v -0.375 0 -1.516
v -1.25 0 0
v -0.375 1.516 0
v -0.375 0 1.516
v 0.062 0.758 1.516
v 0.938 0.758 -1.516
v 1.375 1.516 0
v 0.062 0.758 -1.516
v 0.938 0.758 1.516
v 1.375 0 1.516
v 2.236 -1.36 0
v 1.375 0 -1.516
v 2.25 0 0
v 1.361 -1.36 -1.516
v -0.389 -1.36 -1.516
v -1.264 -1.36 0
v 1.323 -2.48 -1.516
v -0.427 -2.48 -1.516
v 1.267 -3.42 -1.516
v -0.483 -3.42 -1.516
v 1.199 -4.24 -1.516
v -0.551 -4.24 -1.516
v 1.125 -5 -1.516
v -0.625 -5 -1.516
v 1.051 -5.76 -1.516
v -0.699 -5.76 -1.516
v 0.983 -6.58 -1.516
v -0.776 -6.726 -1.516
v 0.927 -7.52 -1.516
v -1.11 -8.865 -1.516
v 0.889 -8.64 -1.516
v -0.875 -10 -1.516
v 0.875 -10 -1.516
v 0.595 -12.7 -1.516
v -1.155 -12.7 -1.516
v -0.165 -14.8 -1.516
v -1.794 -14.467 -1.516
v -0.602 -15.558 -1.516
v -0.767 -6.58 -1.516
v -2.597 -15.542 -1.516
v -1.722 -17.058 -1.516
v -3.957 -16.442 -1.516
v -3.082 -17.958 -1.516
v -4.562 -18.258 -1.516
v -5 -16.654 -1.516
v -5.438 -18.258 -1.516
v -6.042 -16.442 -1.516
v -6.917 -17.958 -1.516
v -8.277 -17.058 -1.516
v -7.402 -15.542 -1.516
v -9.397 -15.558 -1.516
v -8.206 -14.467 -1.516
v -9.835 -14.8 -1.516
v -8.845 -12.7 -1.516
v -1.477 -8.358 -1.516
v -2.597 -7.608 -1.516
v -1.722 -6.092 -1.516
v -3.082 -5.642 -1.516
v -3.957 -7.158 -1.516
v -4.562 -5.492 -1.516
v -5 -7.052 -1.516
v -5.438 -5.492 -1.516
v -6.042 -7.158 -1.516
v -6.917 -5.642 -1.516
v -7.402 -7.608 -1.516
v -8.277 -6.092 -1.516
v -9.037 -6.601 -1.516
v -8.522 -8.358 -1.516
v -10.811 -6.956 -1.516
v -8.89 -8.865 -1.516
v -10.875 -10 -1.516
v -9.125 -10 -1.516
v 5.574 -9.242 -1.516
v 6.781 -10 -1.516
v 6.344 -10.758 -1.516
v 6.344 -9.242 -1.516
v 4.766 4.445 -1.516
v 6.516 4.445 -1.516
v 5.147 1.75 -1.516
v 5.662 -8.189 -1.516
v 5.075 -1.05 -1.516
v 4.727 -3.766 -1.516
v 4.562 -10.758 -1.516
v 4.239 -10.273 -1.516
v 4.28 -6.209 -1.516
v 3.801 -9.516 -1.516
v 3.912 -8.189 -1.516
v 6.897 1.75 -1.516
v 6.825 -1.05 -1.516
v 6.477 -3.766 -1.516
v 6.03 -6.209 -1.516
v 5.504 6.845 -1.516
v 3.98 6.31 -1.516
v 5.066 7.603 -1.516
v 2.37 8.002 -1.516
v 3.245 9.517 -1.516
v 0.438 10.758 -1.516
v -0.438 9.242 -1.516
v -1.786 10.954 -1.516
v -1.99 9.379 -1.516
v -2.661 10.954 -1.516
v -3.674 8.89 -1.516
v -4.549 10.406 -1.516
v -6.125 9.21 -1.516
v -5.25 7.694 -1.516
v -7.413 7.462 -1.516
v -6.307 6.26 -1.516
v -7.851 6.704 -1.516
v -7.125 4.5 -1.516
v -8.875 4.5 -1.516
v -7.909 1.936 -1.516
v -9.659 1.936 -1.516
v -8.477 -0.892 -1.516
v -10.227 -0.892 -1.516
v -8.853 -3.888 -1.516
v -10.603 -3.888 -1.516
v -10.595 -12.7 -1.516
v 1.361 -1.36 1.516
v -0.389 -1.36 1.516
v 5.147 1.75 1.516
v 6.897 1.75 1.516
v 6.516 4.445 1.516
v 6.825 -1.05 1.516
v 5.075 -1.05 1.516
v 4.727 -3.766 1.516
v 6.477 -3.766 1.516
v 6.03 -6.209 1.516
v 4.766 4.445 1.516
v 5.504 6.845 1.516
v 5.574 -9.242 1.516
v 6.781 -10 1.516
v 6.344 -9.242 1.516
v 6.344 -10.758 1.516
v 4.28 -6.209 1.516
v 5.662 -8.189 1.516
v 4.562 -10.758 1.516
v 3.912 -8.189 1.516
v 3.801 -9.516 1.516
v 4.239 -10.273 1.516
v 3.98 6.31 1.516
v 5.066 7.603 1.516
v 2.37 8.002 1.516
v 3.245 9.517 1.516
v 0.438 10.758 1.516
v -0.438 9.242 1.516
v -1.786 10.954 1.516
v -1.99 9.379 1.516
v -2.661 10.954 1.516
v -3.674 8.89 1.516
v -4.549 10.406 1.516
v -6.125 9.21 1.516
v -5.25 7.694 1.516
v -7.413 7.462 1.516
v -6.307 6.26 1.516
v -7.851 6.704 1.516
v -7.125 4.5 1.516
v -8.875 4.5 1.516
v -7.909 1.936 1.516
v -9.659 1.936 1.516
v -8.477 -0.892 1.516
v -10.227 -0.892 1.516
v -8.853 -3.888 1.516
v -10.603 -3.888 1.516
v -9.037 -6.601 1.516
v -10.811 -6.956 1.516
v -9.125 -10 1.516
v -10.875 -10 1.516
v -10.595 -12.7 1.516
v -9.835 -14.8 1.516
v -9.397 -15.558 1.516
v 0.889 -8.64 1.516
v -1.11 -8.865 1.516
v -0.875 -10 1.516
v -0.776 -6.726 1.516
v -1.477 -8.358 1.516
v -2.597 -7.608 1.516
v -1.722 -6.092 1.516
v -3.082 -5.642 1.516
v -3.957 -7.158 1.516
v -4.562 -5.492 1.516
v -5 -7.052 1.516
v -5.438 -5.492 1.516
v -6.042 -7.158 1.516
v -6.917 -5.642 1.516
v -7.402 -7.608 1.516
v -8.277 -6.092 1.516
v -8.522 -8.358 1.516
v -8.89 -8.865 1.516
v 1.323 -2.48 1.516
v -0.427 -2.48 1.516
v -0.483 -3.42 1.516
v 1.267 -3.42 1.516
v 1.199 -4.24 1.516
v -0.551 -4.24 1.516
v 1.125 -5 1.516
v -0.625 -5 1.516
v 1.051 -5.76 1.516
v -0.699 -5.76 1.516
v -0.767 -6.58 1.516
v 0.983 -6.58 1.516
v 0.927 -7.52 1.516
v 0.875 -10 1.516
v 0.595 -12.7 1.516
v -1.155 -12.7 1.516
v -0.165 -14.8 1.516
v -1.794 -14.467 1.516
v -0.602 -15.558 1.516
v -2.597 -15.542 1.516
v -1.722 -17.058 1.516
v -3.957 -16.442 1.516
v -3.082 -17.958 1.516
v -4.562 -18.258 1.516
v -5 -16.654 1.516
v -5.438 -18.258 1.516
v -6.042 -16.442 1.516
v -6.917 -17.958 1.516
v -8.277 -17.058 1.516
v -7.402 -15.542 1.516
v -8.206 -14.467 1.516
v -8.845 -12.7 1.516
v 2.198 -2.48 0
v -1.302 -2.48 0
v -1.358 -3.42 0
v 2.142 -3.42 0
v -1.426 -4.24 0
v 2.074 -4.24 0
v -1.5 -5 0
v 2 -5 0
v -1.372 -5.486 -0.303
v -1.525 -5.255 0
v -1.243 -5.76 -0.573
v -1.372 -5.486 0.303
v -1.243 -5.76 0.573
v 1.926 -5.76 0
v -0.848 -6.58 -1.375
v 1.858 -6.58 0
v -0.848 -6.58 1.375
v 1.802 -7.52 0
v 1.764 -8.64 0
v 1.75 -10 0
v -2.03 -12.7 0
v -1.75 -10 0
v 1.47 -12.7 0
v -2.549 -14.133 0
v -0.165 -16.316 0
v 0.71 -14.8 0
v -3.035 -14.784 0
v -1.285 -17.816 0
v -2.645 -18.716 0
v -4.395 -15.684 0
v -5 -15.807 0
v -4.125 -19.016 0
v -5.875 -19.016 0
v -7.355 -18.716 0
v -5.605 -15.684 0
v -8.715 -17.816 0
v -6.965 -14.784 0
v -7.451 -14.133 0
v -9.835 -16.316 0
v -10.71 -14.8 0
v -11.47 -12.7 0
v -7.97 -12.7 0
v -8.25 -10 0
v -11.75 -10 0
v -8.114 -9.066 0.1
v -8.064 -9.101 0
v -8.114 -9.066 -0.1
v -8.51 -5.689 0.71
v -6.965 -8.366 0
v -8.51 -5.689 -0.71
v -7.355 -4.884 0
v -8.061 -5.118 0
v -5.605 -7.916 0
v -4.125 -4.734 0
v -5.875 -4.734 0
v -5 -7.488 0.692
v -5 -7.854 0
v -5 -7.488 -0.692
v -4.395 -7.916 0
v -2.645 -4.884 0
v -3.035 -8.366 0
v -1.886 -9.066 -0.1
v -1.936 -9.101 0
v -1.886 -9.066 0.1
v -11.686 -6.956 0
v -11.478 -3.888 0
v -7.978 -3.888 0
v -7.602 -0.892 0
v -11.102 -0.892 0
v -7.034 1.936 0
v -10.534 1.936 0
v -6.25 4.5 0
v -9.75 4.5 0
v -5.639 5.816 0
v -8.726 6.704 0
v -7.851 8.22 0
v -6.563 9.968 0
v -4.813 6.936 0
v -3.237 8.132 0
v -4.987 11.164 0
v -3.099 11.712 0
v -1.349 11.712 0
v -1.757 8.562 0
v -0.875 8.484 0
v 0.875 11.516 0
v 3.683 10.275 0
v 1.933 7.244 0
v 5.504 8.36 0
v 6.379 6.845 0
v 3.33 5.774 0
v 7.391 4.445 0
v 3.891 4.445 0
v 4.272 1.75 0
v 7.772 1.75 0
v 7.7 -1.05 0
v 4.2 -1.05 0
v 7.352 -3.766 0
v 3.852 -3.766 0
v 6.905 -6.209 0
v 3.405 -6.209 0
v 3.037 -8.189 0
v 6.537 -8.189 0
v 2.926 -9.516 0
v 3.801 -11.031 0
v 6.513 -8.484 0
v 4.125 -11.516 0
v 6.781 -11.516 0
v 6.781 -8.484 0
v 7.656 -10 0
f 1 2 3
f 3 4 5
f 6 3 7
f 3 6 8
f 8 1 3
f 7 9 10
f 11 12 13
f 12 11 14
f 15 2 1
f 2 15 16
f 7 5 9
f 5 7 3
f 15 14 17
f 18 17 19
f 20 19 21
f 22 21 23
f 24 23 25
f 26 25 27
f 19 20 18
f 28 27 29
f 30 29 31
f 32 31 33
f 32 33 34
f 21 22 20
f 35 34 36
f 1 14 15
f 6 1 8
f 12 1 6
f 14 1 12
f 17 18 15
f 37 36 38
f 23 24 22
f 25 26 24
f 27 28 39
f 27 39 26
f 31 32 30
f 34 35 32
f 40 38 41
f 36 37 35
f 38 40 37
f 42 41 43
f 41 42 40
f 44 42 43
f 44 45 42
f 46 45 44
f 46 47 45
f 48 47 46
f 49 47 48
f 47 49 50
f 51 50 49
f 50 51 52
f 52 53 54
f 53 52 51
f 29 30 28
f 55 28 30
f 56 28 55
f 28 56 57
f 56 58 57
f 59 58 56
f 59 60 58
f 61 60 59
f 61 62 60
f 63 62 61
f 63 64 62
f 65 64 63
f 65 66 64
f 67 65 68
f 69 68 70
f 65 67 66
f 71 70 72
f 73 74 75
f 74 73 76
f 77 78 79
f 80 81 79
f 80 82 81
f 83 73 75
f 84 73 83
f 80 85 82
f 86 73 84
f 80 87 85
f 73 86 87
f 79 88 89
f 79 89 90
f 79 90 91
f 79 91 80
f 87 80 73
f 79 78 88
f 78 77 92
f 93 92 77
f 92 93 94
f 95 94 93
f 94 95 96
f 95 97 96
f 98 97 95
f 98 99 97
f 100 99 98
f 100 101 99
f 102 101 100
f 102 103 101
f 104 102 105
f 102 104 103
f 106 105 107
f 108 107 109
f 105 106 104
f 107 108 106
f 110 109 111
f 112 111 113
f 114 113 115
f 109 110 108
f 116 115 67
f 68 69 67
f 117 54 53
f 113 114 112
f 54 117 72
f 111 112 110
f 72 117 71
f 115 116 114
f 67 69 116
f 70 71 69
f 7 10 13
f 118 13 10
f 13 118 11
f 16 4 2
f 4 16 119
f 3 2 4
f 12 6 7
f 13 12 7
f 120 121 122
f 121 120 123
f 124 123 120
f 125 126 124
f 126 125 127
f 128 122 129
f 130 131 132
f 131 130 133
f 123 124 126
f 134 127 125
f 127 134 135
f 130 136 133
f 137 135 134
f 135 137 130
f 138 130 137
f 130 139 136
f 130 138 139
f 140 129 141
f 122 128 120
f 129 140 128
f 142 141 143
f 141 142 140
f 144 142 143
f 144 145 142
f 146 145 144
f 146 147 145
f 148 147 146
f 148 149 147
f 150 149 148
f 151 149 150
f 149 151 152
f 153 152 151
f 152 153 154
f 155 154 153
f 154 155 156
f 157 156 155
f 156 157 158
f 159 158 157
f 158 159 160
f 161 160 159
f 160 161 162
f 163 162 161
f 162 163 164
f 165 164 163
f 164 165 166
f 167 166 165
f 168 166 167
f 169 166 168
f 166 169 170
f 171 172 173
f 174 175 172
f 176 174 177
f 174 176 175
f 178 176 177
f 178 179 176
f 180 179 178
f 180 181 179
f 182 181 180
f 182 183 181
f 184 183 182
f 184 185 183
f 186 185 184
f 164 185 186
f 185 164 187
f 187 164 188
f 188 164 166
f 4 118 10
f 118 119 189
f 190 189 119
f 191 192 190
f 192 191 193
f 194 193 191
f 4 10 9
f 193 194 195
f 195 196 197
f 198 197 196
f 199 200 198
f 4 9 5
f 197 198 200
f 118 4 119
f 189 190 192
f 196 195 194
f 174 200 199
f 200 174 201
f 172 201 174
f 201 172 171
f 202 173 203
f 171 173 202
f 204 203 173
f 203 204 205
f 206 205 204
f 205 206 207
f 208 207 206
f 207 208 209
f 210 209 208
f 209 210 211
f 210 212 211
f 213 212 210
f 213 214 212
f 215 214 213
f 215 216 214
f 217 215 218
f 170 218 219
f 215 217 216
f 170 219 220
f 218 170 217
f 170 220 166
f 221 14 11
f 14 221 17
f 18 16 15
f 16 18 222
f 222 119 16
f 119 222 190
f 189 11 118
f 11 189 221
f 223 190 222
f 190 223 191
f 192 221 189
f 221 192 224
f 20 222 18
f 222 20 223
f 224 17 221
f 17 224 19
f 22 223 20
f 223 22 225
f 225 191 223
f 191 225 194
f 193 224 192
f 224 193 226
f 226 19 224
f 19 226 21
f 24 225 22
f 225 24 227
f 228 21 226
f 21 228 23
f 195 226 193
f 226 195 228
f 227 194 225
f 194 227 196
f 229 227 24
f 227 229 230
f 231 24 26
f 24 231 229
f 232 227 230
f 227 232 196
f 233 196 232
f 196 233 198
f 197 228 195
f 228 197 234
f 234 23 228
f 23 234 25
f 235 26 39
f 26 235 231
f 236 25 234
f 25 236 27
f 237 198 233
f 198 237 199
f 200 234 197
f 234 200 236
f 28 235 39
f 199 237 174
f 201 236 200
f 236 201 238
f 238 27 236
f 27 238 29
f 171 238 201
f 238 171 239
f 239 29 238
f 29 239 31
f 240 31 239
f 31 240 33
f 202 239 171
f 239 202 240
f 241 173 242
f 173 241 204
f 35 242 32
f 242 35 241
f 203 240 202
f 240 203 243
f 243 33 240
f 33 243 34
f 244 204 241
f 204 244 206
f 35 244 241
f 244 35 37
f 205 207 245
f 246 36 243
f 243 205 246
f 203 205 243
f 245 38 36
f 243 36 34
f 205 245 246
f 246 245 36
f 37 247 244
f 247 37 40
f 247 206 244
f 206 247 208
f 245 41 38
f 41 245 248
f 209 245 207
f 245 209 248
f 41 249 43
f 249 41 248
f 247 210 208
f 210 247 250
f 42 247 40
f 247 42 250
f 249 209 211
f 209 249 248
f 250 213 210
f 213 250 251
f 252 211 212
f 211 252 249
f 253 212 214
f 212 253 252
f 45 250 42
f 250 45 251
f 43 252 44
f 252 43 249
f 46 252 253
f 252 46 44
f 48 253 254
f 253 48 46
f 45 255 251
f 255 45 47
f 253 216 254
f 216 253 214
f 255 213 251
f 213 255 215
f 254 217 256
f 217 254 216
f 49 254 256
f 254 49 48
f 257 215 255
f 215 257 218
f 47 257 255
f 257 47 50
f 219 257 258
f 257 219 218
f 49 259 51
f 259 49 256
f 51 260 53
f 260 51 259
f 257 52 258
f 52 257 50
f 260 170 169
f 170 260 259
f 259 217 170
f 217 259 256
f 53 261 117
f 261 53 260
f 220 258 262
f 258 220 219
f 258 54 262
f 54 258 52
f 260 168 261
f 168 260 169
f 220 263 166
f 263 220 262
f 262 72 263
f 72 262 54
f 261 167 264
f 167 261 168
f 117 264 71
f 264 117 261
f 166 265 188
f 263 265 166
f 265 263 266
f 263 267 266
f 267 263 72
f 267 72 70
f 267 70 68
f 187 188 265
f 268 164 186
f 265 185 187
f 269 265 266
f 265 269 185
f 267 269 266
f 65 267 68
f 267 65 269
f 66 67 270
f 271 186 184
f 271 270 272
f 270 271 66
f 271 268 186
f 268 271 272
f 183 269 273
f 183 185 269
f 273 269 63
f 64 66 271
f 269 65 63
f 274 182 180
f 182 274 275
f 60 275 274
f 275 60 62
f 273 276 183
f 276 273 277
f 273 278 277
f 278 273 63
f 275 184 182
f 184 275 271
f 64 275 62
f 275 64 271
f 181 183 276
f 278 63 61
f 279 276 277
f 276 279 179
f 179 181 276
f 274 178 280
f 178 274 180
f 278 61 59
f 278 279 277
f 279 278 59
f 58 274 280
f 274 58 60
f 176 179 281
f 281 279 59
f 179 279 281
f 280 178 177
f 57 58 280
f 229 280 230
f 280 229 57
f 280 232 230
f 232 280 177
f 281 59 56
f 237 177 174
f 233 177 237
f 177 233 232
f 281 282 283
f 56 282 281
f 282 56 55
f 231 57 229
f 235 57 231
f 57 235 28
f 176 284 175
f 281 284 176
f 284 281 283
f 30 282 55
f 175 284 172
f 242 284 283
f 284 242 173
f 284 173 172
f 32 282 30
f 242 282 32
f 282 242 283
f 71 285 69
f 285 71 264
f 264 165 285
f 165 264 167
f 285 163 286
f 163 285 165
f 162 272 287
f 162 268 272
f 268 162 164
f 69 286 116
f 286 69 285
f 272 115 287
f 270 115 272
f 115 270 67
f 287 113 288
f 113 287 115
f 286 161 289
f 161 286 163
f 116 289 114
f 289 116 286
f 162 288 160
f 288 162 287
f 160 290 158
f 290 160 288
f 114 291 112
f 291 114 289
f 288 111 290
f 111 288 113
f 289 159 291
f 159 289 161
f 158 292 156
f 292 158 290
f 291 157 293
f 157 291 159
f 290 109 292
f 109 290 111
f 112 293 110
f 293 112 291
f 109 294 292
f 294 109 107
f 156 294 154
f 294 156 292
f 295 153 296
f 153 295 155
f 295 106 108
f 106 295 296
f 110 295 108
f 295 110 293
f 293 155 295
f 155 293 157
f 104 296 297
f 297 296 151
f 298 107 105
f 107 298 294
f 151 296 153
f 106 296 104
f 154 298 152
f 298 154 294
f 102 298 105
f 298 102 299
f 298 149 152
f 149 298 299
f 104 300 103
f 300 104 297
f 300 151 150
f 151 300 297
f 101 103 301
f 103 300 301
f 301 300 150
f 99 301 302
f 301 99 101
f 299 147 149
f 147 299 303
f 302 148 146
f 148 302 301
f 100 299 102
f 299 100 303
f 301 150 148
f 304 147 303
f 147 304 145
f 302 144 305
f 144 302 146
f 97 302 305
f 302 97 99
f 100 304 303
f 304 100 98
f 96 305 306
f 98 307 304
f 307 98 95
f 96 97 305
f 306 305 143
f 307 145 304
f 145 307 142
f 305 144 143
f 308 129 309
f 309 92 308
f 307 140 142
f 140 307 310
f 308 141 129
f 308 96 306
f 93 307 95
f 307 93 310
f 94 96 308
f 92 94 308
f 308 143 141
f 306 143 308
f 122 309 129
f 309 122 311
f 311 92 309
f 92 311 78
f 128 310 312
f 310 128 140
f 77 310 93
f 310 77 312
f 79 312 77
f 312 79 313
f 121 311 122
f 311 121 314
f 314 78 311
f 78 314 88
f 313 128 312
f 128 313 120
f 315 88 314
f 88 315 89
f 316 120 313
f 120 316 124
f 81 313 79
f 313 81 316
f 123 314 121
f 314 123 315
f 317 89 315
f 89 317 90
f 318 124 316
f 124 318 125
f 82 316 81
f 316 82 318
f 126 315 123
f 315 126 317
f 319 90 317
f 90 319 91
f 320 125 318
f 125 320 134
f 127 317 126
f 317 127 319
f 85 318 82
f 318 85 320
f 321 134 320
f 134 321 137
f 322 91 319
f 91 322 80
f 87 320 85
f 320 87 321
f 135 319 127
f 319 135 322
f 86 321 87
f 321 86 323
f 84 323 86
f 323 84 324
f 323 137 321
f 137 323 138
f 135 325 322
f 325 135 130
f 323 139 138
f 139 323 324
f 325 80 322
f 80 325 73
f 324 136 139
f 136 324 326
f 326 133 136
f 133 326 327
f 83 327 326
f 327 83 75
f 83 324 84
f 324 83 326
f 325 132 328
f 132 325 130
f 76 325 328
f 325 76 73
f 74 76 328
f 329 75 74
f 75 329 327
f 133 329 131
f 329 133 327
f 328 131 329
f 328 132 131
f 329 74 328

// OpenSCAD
curve = [ [0.5,0], OFFSET([0,-5]), OFFSET([0,5]),
          [0,-10], OFFSET([0,-10]), OFFSET([0,-10]),
          [-10,-10], OFFSET([0,5]), OFFSET([0,5]),
          [0,-10], OFFSET([0,5]), OFFSET([0,5]),
          [-10,-10], OFFSET([0,10]), OFFSET([-8,2]),
          [0,10], SMOOTH_REL(1.4), OFFSET([-2,0]),
          [5,-10], SYMMETRIC(), OFFSET([-.1,0]), [5.2,-10]

        ];

module end_of_parameters_dummy() {}

//use <bezier.scad>;
/*
Copyright (c) 2017 Alexander R. Pruss.

Licensed under any Creative Commons Attribution license you like or under the
following MIT License.

Permission is hereby granted, free of charge, to any person obtaining a copy
of this software and associated documentation files (the "Software"), to deal
in the Software without restriction, including without limitation the rights
to use, copy, modify, merge, publish, distribute, sublicense, and/or sell
copies of the Software, and to permit persons to whom the Software is
furnished to do so, subject to the following conditions:

The above copyright notice and this permission notice shall be included in all
copies or substantial portions of the Software.

THE SOFTWARE IS PROVIDED "AS IS", WITHOUT WARRANTY OF ANY KIND, EXPRESS OR
IMPLIED, INCLUDING BUT NOT LIMITED TO THE WARRANTIES OF MERCHANTABILITY,
FITNESS FOR A PARTICULAR PURPOSE AND NONINFRINGEMENT. IN NO EVENT SHALL THE
AUTHORS OR COPYRIGHT HOLDERS BE LIABLE FOR ANY CLAIM, DAMAGES OR OTHER
LIABILITY, WHETHER IN AN ACTION OF CONTRACT, TORT OR OTHERWISE, ARISING FROM,
OUT OF OR IN CONNECTION WITH THE SOFTWARE OR THE USE OR OTHER DEALINGS IN THE
SOFTWARE.

*/


// Public domain Bezier stuff from www.thingiverse.com/thing:8443
function BEZ03(u) = pow((1-u), 3);
function BEZ13(u) = 3*u*(pow((1-u),2));
function BEZ23(u) = 3*(pow(u,2))*(1-u);
function BEZ33(u) = pow(u,3);
function PointAlongBez4(p0, p1, p2, p3, u) = [
	BEZ03(u)*p0[0]+BEZ13(u)*p1[0]+BEZ23(u)*p2[0]+BEZ33(u)*p3[0],
	BEZ03(u)*p0[1]+BEZ13(u)*p1[1]+BEZ23(u)*p2[1]+BEZ33(u)*p3[1]];
// End public domain Bezier stuff

function SMOOTH_REL(x) = ["r",x];
function SMOOTH_ABS(x) = ["a",x];
function SYMMETRIC() = ["r",1];
function OFFSET(v) = ["o",v];
function SHARP() = OFFSET([0,0]);
function POLAR(r,angle) = OFFSET(r*[cos(angle),sin(angle)]);
function POINT_IS_SPECIAL(v) = (v[0]=="r" || v[0]=="a" || v[0]=="o");

function normalize2D(v) = v / sqrt(v[0]*v[0]+v[1]*v[1]);

// this does NOT handle offset type points; to handle those, use DecodeBezierOffsets()
function getControlPoint(cp,node,otherCP) = cp[0]=="r"?(node+cp[1]*(node-otherCP)):( cp[0]=="a"?node+cp[1]*normalize2D(node-otherCP):cp );

function Bezier2(p,index=0,precision=0.05,rightEndPoint=true) = let(nPoints=ceil(1/precision)) [for (i=[0:nPoints-(rightEndPoint?0:1)]) PointAlongBez4(p[index+0],p[index+1],p[index+2],p[index+3],i/nPoints)];

function flatten(listOfLists) = [ for(list = listOfLists) for(item = list) item ];


// p is a list of points, in the format:
// [node1,control1,control2,node2,control3, control4,node3, ...]
// You can replace inner control points with:
//   SYMMETRIC: uses a reflection of the control point on the other side of the node
//   SMOOTH_REL(x): like SYMMETRIC, but the distance of the control point to the node is x times the distance of the other control point to the node
//   SMOOTH_ABS(x): like SYMMETRIC, but the distance of the control point to the node is exactly x
// You can also replace any control point with:
//   OFFSET(v): puts the control point at the corresponding node plus the vector v
//   SHARP(): equivalent to OFFSET([0,0]); useful for straight lines
//   POLAR(r,angle): like OFFSET, except the offset is specified in polar coordinates

function DecodeBezierOffset(control,node) = control[0] == "o" ? node+control[1] : control;

// replace all OFFSET/SHARP/POLAR points with coordinates
function DecodeBezierOffsets(p) = [for (i=[0:len(p)-1]) i%3==0?p[i]:(i%3==1?DecodeBezierOffset(p[i],p[i-1]):DecodeBezierOffset(p[i],p[i+1]))];

function DecodeSpecialBezierPoints(p0) = let(p=DecodeBezierOffsets(p0)) [for (i=[0:len(p)-1]) i%3==0?p[i]:(i%3==1?getControlPoint(p[i],p[i-1],p[i-2]):getControlPoint(p[i],p[i+1],p[i+2]))];

function Distance2D(a,b) = sqrt((a[0]-b[0])*(a[0]-b[0])+(a[1]-b[1])*(a[1]-b[1]));

function RemoveDuplicates(p,eps=0.00001) = let(safeEps = eps/len(p)) [for (i=[0:len(p)-1]) if(i==0 || i==len(p)-1 || Distance2D(p[i-1],p[i]) >= safeEps) p[i]];

function Bezier(p,precision=0.05,eps=0.00001) = let(q=DecodeSpecialBezierPoints(p), nodes=(len(p)-1)/3) RemoveDuplicates(flatten([for (i=[0:nodes-1]) Bezier2(q,index=i*3,precision=precision,rightEndPoint=(i==nodes-1))]),eps=eps);

module BezierVisualize(p,precision=0.05,eps=0.00001,lineThickness=0.25,controlLineThickness=0.125,nodeSize=1) {
    $fn = 16;
    p1 = DecodeSpecialBezierPoints(p);
    l = Bezier(p1,precision=precision,eps=eps);
    for (i=[0:len(l)-2]) {
        hull() {
            translate(l[i]) circle(d=lineThickness);
            translate(l[i+1]) circle(d=lineThickness);
        }
    }
    for (i=[0:len(p1)-1]) {
        if (i%3 == 0) {
            color("black") translate(p1[i]) circle(d=nodeSize);
        }
        else {
            node = i%3 == 1 ? i-1 : i+1;
            color("red") translate(p1[i]) circle(d=nodeSize);
            color("red") hull() {
                translate(p1[node]) circle(d=controlLineThickness);
                translate(p1[i]) circle(d=controlLineThickness);
            }
        }
    }
}

//use <ribbon.scad>;
module ribbon(points, thickness=1, closed=false) {
    p = closed ? concat(points, [points[0]]) : points;

    union() {
        for (i=[1:len(p)-1]) {
            hull() {
                translate(p[i-1])
                    if ($children==0)
                        circle(d=thickness, $fn=8);
                    else
                        children();
                translate(p[i])
                    if ($children==0)
                        circle(d=thickness, $fn=8);
                    else
                        children();
            }
        }
    }
}

pi = 3.1415926535897932;
function SIN(theta) = sin(theta * 180 / pi);
function COS(theta) = cos(theta * 180 / pi);
function TAN(theta) = tan(theta * 180 / pi);




//BezierVisualize(curve, lineThickness=0.1, precision=0.1);
ribbon(Bezier(curve, precision=0.1)) sphere(d=3.5, $fn=6);
